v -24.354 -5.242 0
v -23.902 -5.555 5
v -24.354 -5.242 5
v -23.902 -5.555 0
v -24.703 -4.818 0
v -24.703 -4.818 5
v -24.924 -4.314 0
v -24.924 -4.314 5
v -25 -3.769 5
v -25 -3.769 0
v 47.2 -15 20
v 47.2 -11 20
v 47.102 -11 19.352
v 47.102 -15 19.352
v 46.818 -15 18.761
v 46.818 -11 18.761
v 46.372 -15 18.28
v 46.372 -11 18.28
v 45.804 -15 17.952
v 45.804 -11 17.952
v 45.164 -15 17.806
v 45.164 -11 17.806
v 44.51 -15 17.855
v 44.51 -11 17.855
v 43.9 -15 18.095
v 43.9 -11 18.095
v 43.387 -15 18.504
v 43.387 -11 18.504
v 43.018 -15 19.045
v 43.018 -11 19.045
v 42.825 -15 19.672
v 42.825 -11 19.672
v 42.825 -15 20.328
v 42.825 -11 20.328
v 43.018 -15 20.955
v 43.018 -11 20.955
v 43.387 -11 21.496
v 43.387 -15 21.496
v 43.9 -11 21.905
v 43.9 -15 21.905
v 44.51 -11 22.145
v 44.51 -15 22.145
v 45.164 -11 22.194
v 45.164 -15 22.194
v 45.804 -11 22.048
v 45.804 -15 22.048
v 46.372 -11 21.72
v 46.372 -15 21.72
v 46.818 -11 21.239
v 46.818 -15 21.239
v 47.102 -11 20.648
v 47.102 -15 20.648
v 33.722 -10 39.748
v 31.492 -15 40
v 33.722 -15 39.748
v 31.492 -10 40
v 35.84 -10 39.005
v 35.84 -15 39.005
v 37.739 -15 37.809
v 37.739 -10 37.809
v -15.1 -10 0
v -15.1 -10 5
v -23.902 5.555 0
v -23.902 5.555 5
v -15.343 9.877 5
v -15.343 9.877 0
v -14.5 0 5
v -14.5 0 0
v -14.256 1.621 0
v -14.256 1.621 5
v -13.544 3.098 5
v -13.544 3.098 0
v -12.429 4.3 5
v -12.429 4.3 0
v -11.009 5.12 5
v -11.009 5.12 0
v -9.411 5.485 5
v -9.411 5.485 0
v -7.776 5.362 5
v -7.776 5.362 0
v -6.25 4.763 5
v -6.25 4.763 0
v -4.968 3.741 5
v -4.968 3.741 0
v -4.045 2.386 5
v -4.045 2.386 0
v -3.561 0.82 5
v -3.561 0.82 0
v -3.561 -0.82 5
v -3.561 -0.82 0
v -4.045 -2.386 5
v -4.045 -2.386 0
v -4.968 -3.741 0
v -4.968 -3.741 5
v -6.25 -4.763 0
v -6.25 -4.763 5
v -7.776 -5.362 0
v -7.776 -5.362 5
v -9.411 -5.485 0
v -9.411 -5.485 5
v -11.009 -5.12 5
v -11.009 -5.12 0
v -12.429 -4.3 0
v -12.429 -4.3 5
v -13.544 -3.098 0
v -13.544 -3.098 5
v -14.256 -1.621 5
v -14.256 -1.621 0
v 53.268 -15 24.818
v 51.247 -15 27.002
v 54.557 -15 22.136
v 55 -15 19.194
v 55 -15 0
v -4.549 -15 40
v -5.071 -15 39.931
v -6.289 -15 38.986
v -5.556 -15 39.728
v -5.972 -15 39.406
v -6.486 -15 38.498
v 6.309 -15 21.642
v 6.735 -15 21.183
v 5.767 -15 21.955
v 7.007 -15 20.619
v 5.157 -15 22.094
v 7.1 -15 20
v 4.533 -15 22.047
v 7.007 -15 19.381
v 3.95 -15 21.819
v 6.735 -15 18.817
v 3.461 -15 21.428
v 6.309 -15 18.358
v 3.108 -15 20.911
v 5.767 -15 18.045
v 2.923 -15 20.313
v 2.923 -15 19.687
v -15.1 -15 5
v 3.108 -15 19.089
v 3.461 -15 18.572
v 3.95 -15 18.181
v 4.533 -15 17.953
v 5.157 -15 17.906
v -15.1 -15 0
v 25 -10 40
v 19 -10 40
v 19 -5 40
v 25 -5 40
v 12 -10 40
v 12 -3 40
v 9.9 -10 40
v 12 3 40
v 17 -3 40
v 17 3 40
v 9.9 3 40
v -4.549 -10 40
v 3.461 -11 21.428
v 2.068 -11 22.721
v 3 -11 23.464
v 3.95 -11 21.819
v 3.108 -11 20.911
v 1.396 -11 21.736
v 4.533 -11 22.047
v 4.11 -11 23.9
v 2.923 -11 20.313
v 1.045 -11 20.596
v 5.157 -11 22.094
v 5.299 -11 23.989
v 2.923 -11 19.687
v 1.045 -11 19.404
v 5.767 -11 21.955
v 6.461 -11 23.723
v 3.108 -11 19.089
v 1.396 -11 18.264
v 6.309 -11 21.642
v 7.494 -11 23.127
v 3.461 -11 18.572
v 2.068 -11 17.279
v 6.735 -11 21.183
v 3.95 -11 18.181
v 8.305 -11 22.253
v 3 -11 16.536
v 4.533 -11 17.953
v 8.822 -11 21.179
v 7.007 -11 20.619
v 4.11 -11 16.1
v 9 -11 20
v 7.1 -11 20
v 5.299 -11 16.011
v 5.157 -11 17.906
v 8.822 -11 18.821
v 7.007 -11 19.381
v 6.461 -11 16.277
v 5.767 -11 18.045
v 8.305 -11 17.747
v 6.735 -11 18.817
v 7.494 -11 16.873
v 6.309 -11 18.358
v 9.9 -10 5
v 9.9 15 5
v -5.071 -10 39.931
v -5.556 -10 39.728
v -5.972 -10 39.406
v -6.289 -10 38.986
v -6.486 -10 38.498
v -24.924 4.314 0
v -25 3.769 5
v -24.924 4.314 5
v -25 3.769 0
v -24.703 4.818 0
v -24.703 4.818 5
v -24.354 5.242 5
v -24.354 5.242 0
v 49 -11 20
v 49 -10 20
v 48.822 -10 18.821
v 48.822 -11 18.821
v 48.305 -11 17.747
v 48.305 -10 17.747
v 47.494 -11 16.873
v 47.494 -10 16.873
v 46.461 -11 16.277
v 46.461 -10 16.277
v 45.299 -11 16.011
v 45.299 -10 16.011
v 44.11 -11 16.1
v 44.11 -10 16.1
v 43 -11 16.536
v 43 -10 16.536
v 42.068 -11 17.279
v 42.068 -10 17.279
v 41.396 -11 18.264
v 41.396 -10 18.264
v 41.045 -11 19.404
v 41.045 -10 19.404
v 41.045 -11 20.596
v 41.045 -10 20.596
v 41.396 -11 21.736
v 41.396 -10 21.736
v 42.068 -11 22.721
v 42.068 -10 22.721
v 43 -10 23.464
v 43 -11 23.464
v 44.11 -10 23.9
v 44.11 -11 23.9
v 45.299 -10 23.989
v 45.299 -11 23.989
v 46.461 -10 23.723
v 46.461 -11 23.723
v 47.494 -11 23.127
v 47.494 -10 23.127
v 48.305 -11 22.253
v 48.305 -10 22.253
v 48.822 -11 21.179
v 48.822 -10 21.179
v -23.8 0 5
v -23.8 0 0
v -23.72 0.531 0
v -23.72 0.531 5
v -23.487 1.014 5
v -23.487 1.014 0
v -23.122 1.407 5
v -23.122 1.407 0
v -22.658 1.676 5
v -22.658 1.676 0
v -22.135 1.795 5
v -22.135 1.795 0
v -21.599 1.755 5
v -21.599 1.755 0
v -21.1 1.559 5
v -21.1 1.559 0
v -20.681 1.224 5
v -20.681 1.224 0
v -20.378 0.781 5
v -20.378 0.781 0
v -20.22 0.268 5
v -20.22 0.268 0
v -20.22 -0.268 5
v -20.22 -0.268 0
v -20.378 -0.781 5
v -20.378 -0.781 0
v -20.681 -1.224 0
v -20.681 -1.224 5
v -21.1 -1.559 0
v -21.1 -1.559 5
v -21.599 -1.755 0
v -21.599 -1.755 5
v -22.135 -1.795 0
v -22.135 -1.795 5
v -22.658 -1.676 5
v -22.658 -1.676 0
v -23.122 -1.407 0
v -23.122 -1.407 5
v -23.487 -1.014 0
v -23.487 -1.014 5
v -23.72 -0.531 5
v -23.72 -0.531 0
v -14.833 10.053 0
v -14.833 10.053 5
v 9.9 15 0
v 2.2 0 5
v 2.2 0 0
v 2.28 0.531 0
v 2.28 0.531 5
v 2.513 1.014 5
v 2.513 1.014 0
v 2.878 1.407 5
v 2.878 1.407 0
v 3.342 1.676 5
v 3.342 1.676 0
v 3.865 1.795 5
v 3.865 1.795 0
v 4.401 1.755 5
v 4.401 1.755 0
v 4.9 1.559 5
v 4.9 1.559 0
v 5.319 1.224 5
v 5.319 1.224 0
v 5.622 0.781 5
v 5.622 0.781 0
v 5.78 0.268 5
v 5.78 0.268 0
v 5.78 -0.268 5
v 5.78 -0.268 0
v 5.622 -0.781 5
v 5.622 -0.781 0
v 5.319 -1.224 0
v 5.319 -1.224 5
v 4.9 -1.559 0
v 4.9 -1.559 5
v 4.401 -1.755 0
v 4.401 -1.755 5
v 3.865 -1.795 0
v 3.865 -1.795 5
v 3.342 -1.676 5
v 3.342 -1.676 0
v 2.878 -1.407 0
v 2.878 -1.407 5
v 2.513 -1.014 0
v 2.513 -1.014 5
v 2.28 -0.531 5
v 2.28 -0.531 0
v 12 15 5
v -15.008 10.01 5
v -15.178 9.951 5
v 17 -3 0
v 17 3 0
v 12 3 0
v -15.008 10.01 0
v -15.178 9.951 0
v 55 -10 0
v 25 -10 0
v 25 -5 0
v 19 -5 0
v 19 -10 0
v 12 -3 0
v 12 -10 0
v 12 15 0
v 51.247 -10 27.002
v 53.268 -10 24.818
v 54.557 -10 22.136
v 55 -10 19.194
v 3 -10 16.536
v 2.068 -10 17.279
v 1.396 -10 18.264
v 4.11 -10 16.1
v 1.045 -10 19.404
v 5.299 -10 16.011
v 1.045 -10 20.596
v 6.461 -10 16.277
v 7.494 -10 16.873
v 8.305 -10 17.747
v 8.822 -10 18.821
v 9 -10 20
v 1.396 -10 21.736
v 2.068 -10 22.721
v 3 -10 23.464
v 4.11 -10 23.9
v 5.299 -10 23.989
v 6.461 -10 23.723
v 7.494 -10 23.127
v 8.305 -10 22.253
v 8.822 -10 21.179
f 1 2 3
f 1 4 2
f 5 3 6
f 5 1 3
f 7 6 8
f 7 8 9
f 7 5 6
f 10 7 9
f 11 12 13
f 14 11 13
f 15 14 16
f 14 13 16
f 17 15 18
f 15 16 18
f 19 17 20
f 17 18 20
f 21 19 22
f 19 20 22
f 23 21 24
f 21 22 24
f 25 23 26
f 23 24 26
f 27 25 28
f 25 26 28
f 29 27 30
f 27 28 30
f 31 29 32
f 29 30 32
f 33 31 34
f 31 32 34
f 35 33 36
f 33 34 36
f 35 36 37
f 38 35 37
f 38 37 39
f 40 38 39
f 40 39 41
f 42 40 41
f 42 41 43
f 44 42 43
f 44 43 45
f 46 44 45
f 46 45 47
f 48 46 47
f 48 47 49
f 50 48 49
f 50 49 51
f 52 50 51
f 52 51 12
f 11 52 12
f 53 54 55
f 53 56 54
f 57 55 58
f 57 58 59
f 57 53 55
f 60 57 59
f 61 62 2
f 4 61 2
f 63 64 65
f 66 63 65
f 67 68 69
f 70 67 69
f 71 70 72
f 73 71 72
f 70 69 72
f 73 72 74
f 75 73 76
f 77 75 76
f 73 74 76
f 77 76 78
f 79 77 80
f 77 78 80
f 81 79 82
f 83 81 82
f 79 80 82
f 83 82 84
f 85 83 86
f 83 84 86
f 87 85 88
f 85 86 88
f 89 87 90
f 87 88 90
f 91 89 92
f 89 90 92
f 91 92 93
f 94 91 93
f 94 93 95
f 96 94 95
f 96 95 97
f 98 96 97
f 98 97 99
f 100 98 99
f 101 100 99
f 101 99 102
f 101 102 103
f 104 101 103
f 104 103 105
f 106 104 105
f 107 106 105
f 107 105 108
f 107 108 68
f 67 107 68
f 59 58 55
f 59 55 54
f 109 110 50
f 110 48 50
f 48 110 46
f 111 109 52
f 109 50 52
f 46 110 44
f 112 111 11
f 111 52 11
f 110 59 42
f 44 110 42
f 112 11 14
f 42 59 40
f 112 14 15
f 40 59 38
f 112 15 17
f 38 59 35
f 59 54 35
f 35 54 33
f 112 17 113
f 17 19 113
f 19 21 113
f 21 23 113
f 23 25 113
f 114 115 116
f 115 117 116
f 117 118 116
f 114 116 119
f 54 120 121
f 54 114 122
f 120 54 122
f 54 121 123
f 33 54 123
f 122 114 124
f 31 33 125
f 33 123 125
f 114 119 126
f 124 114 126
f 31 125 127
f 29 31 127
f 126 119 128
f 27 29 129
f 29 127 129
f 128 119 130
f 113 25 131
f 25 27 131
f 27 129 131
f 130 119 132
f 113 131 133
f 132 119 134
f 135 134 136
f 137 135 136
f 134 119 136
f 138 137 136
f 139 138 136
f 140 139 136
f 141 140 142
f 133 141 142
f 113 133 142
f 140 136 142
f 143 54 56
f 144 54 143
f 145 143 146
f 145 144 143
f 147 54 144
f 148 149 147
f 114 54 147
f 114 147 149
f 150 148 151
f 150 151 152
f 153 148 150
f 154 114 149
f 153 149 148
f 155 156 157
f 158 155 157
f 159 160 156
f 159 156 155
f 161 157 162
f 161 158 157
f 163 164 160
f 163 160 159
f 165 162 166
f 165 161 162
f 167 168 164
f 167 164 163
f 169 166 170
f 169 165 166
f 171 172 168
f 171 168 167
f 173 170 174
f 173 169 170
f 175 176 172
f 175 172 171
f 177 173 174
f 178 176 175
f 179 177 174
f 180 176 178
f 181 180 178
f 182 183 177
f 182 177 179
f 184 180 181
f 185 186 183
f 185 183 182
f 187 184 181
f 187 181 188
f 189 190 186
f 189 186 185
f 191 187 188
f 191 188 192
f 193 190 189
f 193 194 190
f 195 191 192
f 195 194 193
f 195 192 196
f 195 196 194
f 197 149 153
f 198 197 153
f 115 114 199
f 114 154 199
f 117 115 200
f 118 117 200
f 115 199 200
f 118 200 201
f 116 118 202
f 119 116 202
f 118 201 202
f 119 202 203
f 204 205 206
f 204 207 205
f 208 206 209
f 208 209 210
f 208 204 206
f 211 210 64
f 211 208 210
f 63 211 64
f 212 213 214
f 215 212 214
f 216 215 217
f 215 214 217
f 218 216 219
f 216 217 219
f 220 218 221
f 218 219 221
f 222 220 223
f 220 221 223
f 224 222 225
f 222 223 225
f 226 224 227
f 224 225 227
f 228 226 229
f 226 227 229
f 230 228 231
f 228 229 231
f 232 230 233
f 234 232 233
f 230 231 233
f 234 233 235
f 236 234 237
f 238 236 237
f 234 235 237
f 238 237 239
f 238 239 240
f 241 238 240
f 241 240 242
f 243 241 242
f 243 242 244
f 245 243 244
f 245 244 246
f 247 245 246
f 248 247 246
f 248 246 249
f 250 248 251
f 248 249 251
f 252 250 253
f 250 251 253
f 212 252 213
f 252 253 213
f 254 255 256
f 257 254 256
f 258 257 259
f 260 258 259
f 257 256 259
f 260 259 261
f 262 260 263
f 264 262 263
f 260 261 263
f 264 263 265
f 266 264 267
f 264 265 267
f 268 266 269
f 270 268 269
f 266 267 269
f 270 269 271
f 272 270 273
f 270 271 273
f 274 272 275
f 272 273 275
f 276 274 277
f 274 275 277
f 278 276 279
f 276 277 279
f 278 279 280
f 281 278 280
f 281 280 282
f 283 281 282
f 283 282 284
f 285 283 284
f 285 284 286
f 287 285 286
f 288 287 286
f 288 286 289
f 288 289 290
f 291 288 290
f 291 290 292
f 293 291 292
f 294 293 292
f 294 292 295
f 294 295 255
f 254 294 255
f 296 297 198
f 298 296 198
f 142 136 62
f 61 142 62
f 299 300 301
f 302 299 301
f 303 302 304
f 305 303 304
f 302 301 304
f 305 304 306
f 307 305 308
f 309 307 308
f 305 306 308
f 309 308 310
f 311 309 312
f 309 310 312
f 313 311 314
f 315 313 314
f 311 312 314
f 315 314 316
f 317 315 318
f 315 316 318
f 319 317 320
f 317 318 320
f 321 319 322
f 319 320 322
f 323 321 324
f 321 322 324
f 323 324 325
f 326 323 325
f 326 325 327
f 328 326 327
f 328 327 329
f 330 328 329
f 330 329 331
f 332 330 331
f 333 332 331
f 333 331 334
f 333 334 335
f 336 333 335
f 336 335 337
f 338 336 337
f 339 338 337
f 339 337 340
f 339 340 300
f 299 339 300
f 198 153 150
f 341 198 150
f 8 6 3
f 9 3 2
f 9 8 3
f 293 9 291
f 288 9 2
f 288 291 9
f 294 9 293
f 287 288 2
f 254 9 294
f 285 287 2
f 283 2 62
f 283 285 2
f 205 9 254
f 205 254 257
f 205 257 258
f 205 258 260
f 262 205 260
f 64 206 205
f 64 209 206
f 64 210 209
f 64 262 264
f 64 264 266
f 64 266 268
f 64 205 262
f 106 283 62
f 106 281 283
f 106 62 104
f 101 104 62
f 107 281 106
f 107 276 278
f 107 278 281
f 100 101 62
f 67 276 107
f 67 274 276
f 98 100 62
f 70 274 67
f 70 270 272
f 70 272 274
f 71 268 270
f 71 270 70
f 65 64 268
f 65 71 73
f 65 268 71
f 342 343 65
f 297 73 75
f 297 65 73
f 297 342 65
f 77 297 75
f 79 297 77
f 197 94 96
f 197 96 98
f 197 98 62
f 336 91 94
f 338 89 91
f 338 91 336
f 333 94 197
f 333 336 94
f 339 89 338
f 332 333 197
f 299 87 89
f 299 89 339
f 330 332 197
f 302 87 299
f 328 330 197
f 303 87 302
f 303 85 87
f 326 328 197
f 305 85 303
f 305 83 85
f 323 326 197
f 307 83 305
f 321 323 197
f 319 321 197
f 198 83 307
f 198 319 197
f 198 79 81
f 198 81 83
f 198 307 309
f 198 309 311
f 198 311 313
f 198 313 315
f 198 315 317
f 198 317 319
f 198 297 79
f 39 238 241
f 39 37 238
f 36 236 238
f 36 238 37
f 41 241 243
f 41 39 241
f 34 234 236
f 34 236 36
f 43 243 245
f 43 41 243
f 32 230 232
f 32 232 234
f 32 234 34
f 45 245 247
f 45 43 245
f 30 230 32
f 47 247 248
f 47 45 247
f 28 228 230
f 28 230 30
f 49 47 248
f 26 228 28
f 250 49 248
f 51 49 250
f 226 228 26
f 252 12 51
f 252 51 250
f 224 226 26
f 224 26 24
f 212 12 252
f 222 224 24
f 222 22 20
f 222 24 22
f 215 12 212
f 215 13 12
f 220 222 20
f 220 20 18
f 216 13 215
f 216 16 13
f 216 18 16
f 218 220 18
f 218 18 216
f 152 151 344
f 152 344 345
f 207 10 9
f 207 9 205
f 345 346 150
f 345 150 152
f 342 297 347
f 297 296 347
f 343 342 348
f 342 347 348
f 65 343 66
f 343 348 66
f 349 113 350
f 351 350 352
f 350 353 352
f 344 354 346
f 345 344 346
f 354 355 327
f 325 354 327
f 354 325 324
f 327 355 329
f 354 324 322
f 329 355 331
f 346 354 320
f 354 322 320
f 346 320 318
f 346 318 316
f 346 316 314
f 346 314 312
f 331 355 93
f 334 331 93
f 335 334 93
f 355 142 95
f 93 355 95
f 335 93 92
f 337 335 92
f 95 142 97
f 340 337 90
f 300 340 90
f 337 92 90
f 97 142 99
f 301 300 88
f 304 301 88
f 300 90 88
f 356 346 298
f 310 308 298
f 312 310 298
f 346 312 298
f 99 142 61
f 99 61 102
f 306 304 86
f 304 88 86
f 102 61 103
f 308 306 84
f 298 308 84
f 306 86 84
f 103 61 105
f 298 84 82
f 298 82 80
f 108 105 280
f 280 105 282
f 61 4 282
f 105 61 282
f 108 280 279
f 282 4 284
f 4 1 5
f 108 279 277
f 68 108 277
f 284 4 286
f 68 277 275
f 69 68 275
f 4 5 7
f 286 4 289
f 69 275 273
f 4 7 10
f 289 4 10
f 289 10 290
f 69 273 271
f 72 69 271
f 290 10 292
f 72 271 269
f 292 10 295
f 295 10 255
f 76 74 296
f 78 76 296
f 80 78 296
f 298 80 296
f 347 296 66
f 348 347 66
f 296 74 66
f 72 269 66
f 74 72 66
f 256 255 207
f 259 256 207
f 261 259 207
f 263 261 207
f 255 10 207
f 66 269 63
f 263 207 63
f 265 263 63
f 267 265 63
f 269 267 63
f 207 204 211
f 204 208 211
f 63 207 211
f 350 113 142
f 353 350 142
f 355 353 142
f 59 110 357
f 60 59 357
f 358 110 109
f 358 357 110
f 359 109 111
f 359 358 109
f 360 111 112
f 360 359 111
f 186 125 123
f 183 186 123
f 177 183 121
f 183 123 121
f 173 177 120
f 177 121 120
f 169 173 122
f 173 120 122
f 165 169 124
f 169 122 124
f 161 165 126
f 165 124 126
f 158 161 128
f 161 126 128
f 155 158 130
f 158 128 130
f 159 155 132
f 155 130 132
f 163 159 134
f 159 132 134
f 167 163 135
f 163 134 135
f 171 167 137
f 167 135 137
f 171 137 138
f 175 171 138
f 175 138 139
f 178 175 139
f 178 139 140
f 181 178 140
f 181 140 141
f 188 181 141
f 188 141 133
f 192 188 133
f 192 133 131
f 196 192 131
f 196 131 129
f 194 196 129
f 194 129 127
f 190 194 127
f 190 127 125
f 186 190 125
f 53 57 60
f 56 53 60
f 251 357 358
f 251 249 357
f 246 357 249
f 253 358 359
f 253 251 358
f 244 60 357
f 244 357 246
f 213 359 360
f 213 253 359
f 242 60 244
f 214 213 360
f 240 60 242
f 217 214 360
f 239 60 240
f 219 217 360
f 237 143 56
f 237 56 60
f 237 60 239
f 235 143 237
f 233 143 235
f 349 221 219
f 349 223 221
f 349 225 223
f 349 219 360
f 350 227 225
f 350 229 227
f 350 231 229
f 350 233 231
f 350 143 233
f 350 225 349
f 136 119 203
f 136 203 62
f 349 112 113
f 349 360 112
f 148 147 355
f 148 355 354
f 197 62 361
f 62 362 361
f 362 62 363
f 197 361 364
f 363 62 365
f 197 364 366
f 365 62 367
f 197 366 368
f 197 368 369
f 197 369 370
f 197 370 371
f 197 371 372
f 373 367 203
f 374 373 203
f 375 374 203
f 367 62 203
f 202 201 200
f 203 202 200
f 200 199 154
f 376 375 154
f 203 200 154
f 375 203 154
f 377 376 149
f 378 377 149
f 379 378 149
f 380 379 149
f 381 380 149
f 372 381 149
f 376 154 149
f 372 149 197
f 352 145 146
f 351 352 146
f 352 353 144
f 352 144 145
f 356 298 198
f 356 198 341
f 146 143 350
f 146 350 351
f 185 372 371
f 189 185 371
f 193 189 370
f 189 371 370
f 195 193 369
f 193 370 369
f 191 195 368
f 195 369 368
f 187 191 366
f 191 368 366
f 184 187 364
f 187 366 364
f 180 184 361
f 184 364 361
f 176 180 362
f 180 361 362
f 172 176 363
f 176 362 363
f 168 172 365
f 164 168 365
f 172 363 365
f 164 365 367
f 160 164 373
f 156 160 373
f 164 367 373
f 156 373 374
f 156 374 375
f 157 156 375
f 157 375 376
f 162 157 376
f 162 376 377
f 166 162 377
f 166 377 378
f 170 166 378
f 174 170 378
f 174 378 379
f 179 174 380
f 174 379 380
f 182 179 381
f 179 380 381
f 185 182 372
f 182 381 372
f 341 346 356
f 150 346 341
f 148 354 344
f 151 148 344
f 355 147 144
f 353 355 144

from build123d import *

# Parameters (mm, degrees)
ESQUISSE1_W              = 50
ESQUISSE1_H              = 30
BOSS_EXTRU_1_DEPTH       = 40
ESQUISSE2_W              = 7
ESQUISSE2_H              = 7
ENL_V_MAT_EXTRU_1_DEPTH  = 41
ESQUISSE3_W              = 8
ESQUISSE3_H              = 10
ENL_V_MAT_EXTRU_2_DEPTH  = 41
ESQUISSE5_W              = 34.9
ESQUISSE5_H              = 30
ENL_V_MAT_EXTRU_4_DEPTH  = 35
ESQUISSE7_R              = 5.5
ESQUISSE7_R_2            = 1.8
ENL_V_MAT_EXTRU_6_DEPTH  = 41
BOSS_EXTRU_2_DEPTH       = 5
ESQUISSE10_R             = 2.1
ENL_V_MAT_EXTRU_7_DEPTH  = 31
ESQUISSE11_R             = 4
ENL_V_MAT_EXTRU_8_DEPTH  = 1
ENL_V_MAT_EXTRU_9_DEPTH  = 6
CONG_2_R                 = 2
ESQUISSE14_W             = 13
ESQUISSE14_H             = 12
ENL_V_MAT_EXTRU_10_DEPTH = 41
ESQUISSE15_W             = 40
ESQUISSE15_H             = 5
BOSS_EXTRU_3_DEPTH       = 30
ESQUISSE16_R             = 2.2
ENL_V_MAT_EXTRU_11_DEPTH = 6
ESQUISSE17_R             = 4
ENL_V_MAT_EXTRU_12_DEPTH = 1
CHANFREIN1_SIZE          = 20
CHANFREIN1_SIZE2         = 16
CONG_3_R                 = 10
CHANFREIN2_SIZE          = 35
CHANFREIN2_SIZE2         = 12
CONG_4_R                 = 10


with BuildPart() as part:
    # Esquisse1 → Boss.-Extru.1 (new body)
    with BuildSketch(Plane.XY):
        Rectangle(ESQUISSE1_W, ESQUISSE1_H)
    extrude(amount=BOSS_EXTRU_1_DEPTH)

    # Esquisse2 → Enlèv. mat.-Extru.1 (cut, through all)
    with BuildSketch(Plane.XY.offset(40)):
        with Locations((15.5, -6.5)):
            Rectangle(ESQUISSE2_W, ESQUISSE2_H)
        with Locations((15.5, 6.5)):
            Rectangle(ESQUISSE2_W, ESQUISSE2_H)
    extrude(amount=-ENL_V_MAT_EXTRU_1_DEPTH, mode=Mode.SUBTRACT)

    # Esquisse3 → Enlèv. mat.-Extru.2 (cut, through all)
    with BuildSketch(Plane.XY.offset(40)):
        with Locations((21, 0)):
            Rectangle(ESQUISSE3_W, ESQUISSE3_H)
    extrude(amount=-ENL_V_MAT_EXTRU_2_DEPTH, mode=Mode.SUBTRACT)

    # Esquisse5 → Enlèv. mat.-Extru.4 (cut)
    with BuildSketch(Plane.XY.offset(40)):
        with Locations((-7.55, 0)):
            Rectangle(ESQUISSE5_W, ESQUISSE5_H)
    extrude(amount=-ENL_V_MAT_EXTRU_4_DEPTH, mode=Mode.SUBTRACT)

    # Esquisse7 → Enlèv. mat.-Extru.6 (cut, through all)
    with BuildSketch(Plane(origin=(0, 0, 0), x_dir=(-1, 0, 0), z_dir=(0, 0, -1))):
        with Locations((9, 0)):
            Circle(ESQUISSE7_R)
        with Locations((22, 0)):
            Circle(ESQUISSE7_R_2)
        with Locations((-4, 0)):
            Circle(ESQUISSE7_R_2)
    extrude(amount=-ENL_V_MAT_EXTRU_6_DEPTH, mode=Mode.SUBTRACT)

    # Esquisse9 → Boss.-Extru.2 (add)
    with BuildSketch(Plane.XZ.offset(15)):
        Polygon((9.9, 40), (-6.1, 40), (-15.1, 5), (9.9, 5), align=None)
    extrude(amount=-BOSS_EXTRU_2_DEPTH)

    # Esquisse10 → Enlèv. mat.-Extru.7 (cut, through all)
    with BuildSketch(Plane.XZ.offset(15)):
        with Locations((5, 20)):
            Circle(ESQUISSE10_R)
    extrude(amount=-ENL_V_MAT_EXTRU_7_DEPTH, mode=Mode.SUBTRACT)

    # Esquisse11 → Enlèv. mat.-Extru.8 (cut)
    with BuildSketch(Plane(origin=(0, -10, 0), x_dir=(1, 0, 0), z_dir=(0, 1, 0))):
        with Locations((5, -20)):
            Circle(ESQUISSE11_R)
    extrude(amount=-ENL_V_MAT_EXTRU_8_DEPTH, mode=Mode.SUBTRACT)

    # Esquisse13 → Enlèv. mat.-Extru.9 (cut, through all)
    with BuildSketch(Plane.XY.offset(5)):
        Polygon((-15.1, -15), (-15.1, -10), (-25, -5), (-25, -15), align=None)
        Polygon((-25, 5), (-15.1, 10), (9.9, 15), (-25, 15), align=None)
    extrude(amount=-ENL_V_MAT_EXTRU_9_DEPTH, mode=Mode.SUBTRACT)

    # Congé2
    cong_2_edges = [part.edges().sort_by_distance(p)[0] for p in [
        (-6.1, -12.5, 40),
        (-25, -5, 2.5),
        (-25, 5, 2.5),
        (-15.1, 10, 2.5),
    ]]
    fillet(cong_2_edges, radius=CONG_2_R)

    # Esquisse14 → Enlèv. mat.-Extru.10 (cut, through all)
    with BuildSketch(Plane.XY.offset(40)):
        with Locations((18.5, 9)):
            Rectangle(ESQUISSE14_W, ESQUISSE14_H)
    extrude(amount=-ENL_V_MAT_EXTRU_10_DEPTH, mode=Mode.SUBTRACT)

    # Esquisse15 → Boss.-Extru.3 (add)
    with BuildSketch(Plane(origin=(25, 0, 0), x_dir=(0, 0, -1), z_dir=(1, 0, 0))):
        with Locations((-20, -12.5)):
            Rectangle(ESQUISSE15_W, ESQUISSE15_H)
    extrude(amount=BOSS_EXTRU_3_DEPTH)

    # Esquisse16 → Enlèv. mat.-Extru.11 (cut, through all)
    with BuildSketch(Plane(origin=(0, -10, 0), x_dir=(1, 0, 0), z_dir=(0, 1, 0))):
        with Locations((45, -20)):
            Circle(ESQUISSE16_R)
    extrude(amount=-ENL_V_MAT_EXTRU_11_DEPTH, mode=Mode.SUBTRACT)

    # Esquisse17 → Enlèv. mat.-Extru.12 (cut)
    with BuildSketch(Plane(origin=(0, -10, 0), x_dir=(1, 0, 0), z_dir=(0, 1, 0))):
        with Locations((45, -20)):
            Circle(ESQUISSE17_R)
    extrude(amount=-ENL_V_MAT_EXTRU_12_DEPTH, mode=Mode.SUBTRACT)

    # Chanfrein1
    chanfrein1_edges = [part.edges().sort_by_distance(p)[0] for p in [
        (55, -12.5, 40),
    ]]
    chanfrein1_side = [part.faces().sort_by_distance(p)[0] for p in [
        (22.378363324, -9.30070091, 40),
    ]]
    chamfer(chanfrein1_edges, length=CHANFREIN1_SIZE, length2=CHANFREIN1_SIZE2, reference=chanfrein1_side[0])

    # Congé3
    cong_3_edges = [part.edges().sort_by_distance(p)[0] for p in [
        (55, -12.5, 24),
    ]]
    fillet(cong_3_edges, radius=CONG_3_R)

    # Chanfrein2
    chanfrein2_edges = [part.edges().sort_by_distance(p)[0] for p in [
        (10.95, 15, 40),
    ]]
    chanfrein2_side = [part.faces().sort_by_distance(p)[0] for p in [
        (10.95, 15, 20),
    ]]
    chamfer(chanfrein2_edges, length=CHANFREIN2_SIZE, length2=CHANFREIN2_SIZE2, reference=chanfrein2_side[0])

    # Congé4
    cong_4_edges = [part.edges().sort_by_distance(p)[0] for p in [
        (35, -12.5, 40),
    ]]
    fillet(cong_4_edges, radius=CONG_4_R)


solid = part.part
